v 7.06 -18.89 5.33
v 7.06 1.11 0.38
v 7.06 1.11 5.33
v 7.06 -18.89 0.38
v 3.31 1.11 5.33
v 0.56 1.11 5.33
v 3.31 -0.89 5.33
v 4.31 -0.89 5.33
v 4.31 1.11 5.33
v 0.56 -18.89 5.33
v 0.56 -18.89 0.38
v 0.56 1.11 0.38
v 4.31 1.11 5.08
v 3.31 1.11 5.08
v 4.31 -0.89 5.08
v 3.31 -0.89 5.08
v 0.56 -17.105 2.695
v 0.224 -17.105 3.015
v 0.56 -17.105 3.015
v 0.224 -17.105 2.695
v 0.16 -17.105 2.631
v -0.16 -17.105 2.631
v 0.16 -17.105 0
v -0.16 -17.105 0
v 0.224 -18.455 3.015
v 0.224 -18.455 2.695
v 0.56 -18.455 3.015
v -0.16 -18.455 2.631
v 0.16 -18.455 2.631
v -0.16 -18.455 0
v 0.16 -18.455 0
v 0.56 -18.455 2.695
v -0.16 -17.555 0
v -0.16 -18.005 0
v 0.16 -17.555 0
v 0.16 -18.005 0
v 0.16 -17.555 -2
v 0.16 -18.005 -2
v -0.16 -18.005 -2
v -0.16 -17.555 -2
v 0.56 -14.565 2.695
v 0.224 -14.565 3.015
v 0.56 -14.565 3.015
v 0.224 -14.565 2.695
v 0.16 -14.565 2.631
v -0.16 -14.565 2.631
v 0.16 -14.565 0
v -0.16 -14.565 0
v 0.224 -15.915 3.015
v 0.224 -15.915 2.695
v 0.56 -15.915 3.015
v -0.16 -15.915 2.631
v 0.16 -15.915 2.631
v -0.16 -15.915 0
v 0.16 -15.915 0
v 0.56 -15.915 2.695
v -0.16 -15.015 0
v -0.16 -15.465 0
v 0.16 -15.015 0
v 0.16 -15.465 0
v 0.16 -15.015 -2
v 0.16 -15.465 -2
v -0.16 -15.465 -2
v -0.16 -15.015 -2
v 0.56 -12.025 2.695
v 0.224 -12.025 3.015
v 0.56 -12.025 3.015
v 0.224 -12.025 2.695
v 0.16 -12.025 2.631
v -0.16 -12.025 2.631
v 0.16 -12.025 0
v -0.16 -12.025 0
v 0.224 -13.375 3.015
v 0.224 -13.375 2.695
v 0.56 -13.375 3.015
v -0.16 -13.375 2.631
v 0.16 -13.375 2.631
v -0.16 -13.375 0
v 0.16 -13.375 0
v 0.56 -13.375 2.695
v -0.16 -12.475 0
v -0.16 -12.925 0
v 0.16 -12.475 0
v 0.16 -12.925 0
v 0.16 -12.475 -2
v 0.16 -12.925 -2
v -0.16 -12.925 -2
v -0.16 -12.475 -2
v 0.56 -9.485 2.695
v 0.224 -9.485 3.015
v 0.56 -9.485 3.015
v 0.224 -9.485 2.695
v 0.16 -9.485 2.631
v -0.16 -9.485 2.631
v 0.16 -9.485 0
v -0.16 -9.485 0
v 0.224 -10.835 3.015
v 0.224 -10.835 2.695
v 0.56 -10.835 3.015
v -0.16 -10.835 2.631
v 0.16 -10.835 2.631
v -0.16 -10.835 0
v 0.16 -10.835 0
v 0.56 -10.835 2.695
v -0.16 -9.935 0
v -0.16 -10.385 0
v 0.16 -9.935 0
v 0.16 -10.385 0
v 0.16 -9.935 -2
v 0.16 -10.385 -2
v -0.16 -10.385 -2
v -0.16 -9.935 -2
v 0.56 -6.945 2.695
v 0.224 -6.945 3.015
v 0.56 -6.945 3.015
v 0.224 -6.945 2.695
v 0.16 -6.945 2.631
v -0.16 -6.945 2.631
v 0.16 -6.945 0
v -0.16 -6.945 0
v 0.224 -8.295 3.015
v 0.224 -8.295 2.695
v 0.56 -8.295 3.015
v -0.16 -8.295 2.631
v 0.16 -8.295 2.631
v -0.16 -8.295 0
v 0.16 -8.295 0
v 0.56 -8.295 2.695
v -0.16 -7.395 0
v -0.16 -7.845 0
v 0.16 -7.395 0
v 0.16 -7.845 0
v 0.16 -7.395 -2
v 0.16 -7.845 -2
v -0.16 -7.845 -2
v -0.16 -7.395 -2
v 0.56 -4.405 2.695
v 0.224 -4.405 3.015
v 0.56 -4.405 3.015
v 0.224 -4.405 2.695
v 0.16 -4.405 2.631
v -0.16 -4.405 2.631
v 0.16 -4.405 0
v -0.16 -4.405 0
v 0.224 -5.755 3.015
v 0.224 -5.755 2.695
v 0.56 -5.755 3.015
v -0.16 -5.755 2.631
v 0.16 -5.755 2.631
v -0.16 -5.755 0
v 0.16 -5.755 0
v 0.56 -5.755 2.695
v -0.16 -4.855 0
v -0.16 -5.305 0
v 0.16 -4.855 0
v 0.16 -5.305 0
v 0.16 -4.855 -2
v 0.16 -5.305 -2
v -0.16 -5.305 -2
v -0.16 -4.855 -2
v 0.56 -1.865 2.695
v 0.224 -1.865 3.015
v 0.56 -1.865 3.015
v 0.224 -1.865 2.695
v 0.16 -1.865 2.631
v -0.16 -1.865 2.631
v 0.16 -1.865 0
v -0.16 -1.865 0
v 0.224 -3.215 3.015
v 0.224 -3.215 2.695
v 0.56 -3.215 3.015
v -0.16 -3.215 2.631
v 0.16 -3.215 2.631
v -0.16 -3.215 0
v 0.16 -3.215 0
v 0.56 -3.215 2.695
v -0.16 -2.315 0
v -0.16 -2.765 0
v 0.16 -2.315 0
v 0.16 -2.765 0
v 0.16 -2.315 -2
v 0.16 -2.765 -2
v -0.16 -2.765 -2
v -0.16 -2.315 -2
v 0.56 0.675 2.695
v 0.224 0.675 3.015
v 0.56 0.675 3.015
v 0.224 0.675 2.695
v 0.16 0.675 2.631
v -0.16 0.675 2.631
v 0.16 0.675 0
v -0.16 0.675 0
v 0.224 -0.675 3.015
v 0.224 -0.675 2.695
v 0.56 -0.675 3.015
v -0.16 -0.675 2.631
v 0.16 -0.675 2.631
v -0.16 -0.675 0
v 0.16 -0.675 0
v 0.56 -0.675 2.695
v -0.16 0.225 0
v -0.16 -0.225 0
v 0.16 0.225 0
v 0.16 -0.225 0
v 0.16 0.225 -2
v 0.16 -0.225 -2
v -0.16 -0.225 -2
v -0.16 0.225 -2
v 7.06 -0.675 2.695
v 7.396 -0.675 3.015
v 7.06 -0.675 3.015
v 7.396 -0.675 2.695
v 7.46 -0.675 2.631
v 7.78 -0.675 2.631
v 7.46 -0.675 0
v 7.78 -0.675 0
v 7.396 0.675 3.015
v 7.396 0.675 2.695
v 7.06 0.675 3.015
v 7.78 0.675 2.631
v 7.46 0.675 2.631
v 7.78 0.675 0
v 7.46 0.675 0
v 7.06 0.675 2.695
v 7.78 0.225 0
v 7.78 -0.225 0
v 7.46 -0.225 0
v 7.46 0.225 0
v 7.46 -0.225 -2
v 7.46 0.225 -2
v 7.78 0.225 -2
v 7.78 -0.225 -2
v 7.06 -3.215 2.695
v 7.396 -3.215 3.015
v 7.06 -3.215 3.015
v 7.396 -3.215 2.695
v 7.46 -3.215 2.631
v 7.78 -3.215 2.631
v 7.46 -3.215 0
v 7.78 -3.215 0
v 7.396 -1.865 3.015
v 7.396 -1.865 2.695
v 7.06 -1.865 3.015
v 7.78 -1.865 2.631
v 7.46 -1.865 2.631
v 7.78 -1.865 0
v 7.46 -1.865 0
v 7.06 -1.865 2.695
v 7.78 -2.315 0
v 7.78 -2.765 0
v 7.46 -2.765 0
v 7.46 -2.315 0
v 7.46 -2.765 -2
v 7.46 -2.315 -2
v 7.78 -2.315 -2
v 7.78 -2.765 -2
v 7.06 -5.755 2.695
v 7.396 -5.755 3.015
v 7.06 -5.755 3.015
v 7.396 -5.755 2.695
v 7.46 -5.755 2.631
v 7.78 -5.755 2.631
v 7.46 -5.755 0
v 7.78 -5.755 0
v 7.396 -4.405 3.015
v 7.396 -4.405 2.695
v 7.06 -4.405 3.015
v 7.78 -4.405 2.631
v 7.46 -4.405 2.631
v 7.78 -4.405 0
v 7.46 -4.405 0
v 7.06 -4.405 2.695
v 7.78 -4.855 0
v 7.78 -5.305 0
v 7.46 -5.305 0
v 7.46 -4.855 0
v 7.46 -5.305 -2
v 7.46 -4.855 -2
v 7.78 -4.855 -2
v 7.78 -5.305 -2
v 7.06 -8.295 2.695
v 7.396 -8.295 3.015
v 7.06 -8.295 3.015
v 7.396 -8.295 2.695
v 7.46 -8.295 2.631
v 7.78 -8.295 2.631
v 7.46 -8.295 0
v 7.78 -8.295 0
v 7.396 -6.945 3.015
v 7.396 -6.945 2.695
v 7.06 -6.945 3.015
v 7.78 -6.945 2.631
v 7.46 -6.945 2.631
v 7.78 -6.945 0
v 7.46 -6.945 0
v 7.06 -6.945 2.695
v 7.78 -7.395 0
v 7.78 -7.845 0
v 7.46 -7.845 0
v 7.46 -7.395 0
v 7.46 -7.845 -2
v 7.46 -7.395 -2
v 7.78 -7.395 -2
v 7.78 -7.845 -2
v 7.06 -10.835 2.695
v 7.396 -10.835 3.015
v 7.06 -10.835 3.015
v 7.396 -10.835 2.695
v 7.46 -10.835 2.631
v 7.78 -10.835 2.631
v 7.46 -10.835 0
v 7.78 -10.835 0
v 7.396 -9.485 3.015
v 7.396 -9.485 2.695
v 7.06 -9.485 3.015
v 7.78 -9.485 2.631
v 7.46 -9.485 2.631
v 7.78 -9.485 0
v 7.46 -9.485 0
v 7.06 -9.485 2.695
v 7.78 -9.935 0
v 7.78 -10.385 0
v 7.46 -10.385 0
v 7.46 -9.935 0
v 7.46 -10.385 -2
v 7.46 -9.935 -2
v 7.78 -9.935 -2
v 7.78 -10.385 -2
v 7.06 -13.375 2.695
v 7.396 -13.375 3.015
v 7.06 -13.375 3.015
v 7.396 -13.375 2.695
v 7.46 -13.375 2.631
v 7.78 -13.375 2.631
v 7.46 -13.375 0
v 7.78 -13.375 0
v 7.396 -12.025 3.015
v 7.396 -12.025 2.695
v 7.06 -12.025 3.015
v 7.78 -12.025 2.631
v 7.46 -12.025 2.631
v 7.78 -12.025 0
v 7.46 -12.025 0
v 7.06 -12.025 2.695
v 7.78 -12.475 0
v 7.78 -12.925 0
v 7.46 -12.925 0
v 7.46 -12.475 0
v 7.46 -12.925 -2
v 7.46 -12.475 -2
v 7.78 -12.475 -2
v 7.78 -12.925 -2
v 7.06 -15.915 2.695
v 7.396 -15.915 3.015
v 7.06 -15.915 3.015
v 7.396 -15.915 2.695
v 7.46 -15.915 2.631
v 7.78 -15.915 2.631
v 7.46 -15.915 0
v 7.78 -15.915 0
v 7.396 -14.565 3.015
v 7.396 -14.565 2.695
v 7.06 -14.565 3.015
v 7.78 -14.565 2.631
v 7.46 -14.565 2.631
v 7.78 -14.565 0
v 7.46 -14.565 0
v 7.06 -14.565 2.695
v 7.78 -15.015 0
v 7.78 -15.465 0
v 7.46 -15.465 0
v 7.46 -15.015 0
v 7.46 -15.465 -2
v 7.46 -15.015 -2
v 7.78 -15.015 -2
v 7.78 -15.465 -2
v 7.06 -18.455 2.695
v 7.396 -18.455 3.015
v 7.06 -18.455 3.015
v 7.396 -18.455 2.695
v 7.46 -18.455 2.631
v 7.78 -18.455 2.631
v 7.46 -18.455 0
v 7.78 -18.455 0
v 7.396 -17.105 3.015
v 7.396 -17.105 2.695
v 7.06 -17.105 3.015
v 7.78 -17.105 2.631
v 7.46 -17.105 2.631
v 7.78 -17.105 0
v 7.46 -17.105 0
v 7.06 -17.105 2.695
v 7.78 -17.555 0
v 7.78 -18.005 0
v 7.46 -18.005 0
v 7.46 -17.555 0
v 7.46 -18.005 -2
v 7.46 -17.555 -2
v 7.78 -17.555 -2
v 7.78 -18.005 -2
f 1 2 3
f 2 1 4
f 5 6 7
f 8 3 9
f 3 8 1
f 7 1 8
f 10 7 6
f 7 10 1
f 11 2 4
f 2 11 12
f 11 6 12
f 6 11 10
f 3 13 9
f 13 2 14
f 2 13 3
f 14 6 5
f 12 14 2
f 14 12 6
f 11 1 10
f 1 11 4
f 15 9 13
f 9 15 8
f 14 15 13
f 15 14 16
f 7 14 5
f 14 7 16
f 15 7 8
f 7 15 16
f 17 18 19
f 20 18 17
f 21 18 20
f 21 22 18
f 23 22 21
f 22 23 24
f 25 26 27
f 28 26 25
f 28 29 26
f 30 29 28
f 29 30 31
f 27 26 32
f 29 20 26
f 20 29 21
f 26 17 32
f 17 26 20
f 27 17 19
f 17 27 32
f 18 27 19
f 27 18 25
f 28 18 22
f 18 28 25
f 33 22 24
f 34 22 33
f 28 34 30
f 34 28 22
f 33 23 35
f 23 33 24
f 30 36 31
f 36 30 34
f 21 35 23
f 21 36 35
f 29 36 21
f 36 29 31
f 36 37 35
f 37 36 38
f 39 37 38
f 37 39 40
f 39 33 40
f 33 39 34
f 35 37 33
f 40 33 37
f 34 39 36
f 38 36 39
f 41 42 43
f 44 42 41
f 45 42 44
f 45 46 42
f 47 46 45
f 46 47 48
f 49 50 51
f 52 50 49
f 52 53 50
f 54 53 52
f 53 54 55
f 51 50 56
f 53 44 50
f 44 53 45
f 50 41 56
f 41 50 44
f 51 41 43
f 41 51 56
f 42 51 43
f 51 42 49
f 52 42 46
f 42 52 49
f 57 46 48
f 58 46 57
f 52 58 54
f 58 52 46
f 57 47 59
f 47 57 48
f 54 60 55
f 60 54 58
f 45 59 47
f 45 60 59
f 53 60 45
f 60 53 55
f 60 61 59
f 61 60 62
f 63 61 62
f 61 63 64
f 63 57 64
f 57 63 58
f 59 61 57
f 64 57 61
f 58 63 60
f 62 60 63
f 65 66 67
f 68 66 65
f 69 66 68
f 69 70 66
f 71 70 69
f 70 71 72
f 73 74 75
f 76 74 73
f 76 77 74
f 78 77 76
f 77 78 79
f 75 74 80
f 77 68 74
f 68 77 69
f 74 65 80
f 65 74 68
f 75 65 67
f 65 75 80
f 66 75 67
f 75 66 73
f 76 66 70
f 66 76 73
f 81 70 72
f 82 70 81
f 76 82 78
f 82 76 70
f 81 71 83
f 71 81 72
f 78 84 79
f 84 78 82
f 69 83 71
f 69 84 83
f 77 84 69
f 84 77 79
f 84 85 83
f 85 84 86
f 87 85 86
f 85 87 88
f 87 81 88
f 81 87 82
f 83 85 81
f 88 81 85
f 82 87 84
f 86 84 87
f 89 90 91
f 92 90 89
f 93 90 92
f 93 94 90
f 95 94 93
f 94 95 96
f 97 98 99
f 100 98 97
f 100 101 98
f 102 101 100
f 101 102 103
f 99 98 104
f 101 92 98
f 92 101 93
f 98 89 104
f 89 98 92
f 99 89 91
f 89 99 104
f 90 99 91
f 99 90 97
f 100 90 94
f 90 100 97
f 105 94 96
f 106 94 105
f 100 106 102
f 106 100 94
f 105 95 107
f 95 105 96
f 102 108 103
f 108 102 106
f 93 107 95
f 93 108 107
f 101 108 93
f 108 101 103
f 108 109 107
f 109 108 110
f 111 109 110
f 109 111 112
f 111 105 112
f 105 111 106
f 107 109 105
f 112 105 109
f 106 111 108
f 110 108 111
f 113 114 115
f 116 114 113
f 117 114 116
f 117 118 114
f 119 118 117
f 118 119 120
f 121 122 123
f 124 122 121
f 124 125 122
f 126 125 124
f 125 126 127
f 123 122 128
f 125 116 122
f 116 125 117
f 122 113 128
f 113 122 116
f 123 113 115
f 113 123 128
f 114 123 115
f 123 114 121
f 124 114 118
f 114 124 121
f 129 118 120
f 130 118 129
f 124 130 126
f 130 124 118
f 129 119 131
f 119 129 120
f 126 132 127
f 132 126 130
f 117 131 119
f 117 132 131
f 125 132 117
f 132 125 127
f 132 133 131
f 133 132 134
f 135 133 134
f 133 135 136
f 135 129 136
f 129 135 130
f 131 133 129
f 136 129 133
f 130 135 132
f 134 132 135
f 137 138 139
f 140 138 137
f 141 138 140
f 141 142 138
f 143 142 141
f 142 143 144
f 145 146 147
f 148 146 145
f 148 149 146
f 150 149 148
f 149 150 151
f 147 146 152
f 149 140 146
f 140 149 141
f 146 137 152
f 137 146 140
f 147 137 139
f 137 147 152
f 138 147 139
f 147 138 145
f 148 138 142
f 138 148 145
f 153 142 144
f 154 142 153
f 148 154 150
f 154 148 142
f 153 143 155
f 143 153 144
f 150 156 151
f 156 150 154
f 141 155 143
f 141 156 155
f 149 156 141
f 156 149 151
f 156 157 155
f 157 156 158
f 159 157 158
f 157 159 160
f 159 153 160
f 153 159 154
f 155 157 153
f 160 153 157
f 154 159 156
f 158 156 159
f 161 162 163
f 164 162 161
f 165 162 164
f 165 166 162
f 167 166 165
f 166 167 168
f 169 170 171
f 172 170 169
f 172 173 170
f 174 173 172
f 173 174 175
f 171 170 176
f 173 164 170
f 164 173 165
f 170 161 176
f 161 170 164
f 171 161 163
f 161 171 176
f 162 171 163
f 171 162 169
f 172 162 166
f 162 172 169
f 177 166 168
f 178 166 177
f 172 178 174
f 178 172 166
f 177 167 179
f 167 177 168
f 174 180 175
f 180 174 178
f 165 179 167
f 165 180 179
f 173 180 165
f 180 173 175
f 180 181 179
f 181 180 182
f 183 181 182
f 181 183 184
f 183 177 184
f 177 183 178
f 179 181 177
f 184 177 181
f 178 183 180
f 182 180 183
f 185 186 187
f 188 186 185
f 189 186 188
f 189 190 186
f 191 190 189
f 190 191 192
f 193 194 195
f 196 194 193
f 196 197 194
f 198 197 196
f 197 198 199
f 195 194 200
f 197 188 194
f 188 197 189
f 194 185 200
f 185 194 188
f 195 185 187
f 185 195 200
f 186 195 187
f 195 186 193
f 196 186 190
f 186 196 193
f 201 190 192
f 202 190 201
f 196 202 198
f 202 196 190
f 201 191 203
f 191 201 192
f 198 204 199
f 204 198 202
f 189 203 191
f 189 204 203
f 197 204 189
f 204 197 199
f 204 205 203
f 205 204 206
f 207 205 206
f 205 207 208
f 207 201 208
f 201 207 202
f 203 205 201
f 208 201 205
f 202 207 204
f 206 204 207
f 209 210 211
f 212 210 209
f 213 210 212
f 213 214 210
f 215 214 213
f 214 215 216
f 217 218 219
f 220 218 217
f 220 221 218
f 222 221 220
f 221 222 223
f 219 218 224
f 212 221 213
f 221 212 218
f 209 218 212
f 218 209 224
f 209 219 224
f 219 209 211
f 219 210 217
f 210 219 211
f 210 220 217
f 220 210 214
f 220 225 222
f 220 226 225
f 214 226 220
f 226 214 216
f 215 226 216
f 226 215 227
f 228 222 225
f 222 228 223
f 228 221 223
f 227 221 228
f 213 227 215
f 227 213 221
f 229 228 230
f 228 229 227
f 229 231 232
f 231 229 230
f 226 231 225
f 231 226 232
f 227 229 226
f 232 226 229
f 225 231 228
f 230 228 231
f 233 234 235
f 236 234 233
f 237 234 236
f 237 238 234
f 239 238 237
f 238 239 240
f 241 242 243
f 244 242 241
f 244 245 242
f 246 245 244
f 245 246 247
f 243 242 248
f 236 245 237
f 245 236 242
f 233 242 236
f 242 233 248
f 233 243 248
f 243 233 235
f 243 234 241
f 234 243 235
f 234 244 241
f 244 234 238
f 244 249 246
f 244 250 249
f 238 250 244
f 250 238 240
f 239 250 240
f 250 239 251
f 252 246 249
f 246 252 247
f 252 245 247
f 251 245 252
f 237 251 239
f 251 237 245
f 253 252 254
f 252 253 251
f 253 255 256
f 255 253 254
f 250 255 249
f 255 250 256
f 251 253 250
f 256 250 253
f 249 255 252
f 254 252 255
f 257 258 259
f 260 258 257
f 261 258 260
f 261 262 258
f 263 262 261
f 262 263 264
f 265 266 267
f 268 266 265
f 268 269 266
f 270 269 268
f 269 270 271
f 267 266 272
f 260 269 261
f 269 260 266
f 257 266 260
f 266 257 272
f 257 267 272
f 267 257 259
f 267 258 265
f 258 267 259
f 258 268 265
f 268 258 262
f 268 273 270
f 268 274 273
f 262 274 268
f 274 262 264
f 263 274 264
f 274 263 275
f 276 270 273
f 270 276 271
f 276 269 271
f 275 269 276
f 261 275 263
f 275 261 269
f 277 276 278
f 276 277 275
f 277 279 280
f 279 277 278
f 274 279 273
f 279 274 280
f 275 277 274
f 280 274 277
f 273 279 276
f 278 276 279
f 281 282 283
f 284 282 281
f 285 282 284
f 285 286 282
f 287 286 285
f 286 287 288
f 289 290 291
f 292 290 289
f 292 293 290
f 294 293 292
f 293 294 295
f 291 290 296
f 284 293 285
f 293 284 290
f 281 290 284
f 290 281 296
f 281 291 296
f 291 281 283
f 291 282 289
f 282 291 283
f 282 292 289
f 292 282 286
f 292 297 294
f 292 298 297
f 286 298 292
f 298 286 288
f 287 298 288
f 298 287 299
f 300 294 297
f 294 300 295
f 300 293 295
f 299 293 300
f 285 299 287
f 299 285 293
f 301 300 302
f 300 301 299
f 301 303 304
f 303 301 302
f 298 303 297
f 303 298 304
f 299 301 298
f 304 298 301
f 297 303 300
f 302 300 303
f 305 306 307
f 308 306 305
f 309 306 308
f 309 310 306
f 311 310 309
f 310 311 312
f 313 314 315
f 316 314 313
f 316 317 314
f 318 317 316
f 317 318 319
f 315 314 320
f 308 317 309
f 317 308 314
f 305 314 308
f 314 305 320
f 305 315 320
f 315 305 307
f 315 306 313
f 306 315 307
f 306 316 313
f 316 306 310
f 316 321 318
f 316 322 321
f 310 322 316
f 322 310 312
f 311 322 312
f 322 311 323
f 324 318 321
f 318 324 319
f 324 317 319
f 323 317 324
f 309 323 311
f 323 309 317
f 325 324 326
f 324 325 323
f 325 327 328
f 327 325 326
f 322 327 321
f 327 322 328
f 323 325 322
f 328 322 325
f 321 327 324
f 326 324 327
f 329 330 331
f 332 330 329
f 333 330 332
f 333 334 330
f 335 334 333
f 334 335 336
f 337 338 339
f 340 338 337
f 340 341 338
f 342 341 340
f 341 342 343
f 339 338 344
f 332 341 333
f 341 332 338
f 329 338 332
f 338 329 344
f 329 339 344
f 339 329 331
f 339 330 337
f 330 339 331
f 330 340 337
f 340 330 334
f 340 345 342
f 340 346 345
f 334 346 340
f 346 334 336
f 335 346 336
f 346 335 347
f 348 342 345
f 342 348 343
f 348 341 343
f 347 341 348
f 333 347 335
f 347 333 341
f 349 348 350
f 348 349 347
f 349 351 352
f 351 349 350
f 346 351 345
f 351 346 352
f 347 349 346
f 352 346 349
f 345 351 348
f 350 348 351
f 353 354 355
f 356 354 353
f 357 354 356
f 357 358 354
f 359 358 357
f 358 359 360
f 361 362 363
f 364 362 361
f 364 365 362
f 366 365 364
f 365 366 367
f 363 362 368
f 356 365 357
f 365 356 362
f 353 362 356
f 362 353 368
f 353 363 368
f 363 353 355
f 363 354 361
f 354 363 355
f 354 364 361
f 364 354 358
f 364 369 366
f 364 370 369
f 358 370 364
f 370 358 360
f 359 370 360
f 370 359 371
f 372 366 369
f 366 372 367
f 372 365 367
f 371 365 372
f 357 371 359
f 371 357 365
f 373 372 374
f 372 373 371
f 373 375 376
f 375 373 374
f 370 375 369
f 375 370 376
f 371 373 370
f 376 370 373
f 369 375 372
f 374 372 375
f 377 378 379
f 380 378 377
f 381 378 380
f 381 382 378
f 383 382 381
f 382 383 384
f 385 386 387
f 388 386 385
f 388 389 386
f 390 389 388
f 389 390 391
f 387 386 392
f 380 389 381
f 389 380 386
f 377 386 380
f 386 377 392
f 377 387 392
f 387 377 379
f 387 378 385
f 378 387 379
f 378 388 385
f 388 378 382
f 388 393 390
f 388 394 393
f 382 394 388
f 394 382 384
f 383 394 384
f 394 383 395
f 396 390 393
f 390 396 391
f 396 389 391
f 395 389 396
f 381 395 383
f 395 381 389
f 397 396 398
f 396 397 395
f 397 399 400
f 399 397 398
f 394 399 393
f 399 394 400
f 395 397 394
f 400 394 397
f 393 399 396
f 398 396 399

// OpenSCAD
// file: proto/dip.scad
/*
OpenSCAD Model:  DIP package

Parameters:
  N  - Number of pins
  P  - Pitch
  TC - Width
  W  - Width of pin
  T  - Thickness of pin
  A  - Body length
  B  - Body width
  H  - Body height
  K  - Elevation
  h  - Pin length
  pincolor - color of pin
  bodycolor - color of plastic body
  simple - 0 = realistic model, 1 = simplified model
*/

module dip(
	N=14,
	P=2.54,
	TC=7.62,
	W=0.45,
	H=5.33,
	T=0.375,
	A=6.35,
	B=19.2,
	K=0.38,
	h=2.0,
	pincolor=[0.9,0.9,0.9],
	bodycolor=[0.2,0.2,0.2],
	simple=0
) {

	module dippinblock()	{
		q=[0,0.173648178,0.342020143,0.5,0.64278761,0.766044443,0.866025404,0.939692621,0.984807753,1];

		x=0.01;
		t2=T/2;
		hk=(H-K)/2+K;
		dt=1.2*T;
		dt2=dt-T;
		cx=dt-t2;
		cy= hk+t2-dt;
		color(pincolor) for (i=[0:(N/2)-1]) {
			 union () {
					translate ([0,-((N/2)-1)/2*P+i*P+1.5*W,0]) rotate(90,[1,0,0]) linear_extrude(height=3*W) {
					if (simple) {
						polygon([
							[-t2,0], [-t2, hk+t2-dt], 	[dt-t2,hk+t2], [(TC-A)/2,hk+t2],[(TC-A)/2,hk-t2], [dt-t2,hk-t2], [t2,hk+t2-dt], [t2,0]]
						);
					} else {
						 polygon([
							[-t2,0],
							[cx-dt*q[9],dt*q[0]+cy],[cx-dt*q[8],dt*q[1]+cy],[cx-dt*q[7],dt*q[2]+cy],[cx-dt*q[6],dt*q[3]+cy],[cx-dt*q[5],dt*q[4]+cy],
							[cx-dt*q[4],dt*q[5]+cy],[cx-dt*q[3],dt*q[6]+cy],[cx-dt*q[2],dt*q[7]+cy],[cx-dt*q[1],dt*q[8]+cy],[cx-dt*q[0],dt*q[9]+cy],
							[dt-t2,hk+t2],
							[(TC-A)/2,hk+t2],[(TC-A)/2,hk-t2],
							[cx-dt2*q[0],dt2*q[9]+cy],[cx-dt2*q[1],dt2*q[8]+cy],[cx-dt2*q[2],dt2*q[7]+cy],[cx-dt2*q[3],dt2*q[6]+cy],[cx-dt2*q[4],dt2*q[5]+cy],
							[cx-dt2*q[5],dt2*q[4]+cy],[cx-dt2*q[6],dt2*q[3]+cy],[cx-dt2*q[7],dt2*q[2]+cy],[cx-dt2*q[8],dt2*q[1]+cy],[cx-dt2*q[9],dt2*q[0]+cy],
							[t2,0]]
						);
					}
					}
				translate ([0,-((N/2)-1)/2*P+i*P,-1]) cube([T,W,2],center=true);
			}
		}
	}
	color(bodycolor) {
		translate([0,0,(H-K)/2+K]) {
			difference() {
			if (simple) {
				cube([A,B,H-K],center=true);
			} else {
				polyhedron(
					[[-A/2+0.2,B/2-0.2,(H-K)/2],[A/2-0.2,B/2-0.2,(H-K)/2],[A/2-0.2,-B/2+0.2,(H-K)/2],[-A/2+0.2,-B/2+0.2,(H-K)/2],
					 [-A/2,B/2,0.1],[A/2,B/2,0.1],[A/2,-B/2,0.1],[-A/2,-B/2,0.1],
					 [-A/2,B/2,-0.1],[A/2,B/2,-0.1],[A/2,-B/2,-0.1],[-A/2,-B/2,-0.1],
					 [-A/2+0.2,B/2-0.2,-(H-K)/2],[A/2-0.2,B/2-0.2,-(H-K)/2],[A/2-0.2,-B/2+0.2,-(H-K)/2],[-A/2+0.2,-B/2+0.2,-(H-K)/2]],
					[
					[0,1,2],[2,3,0],[14,13,12],[12,15,14],
					[0,4,5],[5,1,0],[1,5,6],[6,2,1],[2,6,7],[7,3,2],[3,7,4],[4,0,3],
					[4,8,9],[9,5,4],[5,9,10],[10,6,5],[6,10,11],[11,7,6],[11,8,4],[4,7,11],
					[8,12,13],[13,9,8],[9,13,14],[14,10,9],[10,14,15],[15,11,10],[11,15,12],[12,8,11],
					]
				);
			}
			translate([0,B/2-1,(H-K)/2]) cube([1,2,0.5],center=true);
			}
		}
	}

	translate([-TC/2,0,0]) dippinblock();
	translate([TC/2,0,0]) rotate(180,[0,0,1]) dippinblock();
}
// main file
/*

DIP 16, 0.300mil

*/

include <proto/dip.scad>

translate ([3.81,-8.89,0]) dip(
	N=16,
	P=2.54,
	TC=7.62,
	W=0.45,
	T=0.32,
	A=6.5,
	B=20,
	H=5.33,
	K=0.38,
	h=3.55,
	simple=1
);
